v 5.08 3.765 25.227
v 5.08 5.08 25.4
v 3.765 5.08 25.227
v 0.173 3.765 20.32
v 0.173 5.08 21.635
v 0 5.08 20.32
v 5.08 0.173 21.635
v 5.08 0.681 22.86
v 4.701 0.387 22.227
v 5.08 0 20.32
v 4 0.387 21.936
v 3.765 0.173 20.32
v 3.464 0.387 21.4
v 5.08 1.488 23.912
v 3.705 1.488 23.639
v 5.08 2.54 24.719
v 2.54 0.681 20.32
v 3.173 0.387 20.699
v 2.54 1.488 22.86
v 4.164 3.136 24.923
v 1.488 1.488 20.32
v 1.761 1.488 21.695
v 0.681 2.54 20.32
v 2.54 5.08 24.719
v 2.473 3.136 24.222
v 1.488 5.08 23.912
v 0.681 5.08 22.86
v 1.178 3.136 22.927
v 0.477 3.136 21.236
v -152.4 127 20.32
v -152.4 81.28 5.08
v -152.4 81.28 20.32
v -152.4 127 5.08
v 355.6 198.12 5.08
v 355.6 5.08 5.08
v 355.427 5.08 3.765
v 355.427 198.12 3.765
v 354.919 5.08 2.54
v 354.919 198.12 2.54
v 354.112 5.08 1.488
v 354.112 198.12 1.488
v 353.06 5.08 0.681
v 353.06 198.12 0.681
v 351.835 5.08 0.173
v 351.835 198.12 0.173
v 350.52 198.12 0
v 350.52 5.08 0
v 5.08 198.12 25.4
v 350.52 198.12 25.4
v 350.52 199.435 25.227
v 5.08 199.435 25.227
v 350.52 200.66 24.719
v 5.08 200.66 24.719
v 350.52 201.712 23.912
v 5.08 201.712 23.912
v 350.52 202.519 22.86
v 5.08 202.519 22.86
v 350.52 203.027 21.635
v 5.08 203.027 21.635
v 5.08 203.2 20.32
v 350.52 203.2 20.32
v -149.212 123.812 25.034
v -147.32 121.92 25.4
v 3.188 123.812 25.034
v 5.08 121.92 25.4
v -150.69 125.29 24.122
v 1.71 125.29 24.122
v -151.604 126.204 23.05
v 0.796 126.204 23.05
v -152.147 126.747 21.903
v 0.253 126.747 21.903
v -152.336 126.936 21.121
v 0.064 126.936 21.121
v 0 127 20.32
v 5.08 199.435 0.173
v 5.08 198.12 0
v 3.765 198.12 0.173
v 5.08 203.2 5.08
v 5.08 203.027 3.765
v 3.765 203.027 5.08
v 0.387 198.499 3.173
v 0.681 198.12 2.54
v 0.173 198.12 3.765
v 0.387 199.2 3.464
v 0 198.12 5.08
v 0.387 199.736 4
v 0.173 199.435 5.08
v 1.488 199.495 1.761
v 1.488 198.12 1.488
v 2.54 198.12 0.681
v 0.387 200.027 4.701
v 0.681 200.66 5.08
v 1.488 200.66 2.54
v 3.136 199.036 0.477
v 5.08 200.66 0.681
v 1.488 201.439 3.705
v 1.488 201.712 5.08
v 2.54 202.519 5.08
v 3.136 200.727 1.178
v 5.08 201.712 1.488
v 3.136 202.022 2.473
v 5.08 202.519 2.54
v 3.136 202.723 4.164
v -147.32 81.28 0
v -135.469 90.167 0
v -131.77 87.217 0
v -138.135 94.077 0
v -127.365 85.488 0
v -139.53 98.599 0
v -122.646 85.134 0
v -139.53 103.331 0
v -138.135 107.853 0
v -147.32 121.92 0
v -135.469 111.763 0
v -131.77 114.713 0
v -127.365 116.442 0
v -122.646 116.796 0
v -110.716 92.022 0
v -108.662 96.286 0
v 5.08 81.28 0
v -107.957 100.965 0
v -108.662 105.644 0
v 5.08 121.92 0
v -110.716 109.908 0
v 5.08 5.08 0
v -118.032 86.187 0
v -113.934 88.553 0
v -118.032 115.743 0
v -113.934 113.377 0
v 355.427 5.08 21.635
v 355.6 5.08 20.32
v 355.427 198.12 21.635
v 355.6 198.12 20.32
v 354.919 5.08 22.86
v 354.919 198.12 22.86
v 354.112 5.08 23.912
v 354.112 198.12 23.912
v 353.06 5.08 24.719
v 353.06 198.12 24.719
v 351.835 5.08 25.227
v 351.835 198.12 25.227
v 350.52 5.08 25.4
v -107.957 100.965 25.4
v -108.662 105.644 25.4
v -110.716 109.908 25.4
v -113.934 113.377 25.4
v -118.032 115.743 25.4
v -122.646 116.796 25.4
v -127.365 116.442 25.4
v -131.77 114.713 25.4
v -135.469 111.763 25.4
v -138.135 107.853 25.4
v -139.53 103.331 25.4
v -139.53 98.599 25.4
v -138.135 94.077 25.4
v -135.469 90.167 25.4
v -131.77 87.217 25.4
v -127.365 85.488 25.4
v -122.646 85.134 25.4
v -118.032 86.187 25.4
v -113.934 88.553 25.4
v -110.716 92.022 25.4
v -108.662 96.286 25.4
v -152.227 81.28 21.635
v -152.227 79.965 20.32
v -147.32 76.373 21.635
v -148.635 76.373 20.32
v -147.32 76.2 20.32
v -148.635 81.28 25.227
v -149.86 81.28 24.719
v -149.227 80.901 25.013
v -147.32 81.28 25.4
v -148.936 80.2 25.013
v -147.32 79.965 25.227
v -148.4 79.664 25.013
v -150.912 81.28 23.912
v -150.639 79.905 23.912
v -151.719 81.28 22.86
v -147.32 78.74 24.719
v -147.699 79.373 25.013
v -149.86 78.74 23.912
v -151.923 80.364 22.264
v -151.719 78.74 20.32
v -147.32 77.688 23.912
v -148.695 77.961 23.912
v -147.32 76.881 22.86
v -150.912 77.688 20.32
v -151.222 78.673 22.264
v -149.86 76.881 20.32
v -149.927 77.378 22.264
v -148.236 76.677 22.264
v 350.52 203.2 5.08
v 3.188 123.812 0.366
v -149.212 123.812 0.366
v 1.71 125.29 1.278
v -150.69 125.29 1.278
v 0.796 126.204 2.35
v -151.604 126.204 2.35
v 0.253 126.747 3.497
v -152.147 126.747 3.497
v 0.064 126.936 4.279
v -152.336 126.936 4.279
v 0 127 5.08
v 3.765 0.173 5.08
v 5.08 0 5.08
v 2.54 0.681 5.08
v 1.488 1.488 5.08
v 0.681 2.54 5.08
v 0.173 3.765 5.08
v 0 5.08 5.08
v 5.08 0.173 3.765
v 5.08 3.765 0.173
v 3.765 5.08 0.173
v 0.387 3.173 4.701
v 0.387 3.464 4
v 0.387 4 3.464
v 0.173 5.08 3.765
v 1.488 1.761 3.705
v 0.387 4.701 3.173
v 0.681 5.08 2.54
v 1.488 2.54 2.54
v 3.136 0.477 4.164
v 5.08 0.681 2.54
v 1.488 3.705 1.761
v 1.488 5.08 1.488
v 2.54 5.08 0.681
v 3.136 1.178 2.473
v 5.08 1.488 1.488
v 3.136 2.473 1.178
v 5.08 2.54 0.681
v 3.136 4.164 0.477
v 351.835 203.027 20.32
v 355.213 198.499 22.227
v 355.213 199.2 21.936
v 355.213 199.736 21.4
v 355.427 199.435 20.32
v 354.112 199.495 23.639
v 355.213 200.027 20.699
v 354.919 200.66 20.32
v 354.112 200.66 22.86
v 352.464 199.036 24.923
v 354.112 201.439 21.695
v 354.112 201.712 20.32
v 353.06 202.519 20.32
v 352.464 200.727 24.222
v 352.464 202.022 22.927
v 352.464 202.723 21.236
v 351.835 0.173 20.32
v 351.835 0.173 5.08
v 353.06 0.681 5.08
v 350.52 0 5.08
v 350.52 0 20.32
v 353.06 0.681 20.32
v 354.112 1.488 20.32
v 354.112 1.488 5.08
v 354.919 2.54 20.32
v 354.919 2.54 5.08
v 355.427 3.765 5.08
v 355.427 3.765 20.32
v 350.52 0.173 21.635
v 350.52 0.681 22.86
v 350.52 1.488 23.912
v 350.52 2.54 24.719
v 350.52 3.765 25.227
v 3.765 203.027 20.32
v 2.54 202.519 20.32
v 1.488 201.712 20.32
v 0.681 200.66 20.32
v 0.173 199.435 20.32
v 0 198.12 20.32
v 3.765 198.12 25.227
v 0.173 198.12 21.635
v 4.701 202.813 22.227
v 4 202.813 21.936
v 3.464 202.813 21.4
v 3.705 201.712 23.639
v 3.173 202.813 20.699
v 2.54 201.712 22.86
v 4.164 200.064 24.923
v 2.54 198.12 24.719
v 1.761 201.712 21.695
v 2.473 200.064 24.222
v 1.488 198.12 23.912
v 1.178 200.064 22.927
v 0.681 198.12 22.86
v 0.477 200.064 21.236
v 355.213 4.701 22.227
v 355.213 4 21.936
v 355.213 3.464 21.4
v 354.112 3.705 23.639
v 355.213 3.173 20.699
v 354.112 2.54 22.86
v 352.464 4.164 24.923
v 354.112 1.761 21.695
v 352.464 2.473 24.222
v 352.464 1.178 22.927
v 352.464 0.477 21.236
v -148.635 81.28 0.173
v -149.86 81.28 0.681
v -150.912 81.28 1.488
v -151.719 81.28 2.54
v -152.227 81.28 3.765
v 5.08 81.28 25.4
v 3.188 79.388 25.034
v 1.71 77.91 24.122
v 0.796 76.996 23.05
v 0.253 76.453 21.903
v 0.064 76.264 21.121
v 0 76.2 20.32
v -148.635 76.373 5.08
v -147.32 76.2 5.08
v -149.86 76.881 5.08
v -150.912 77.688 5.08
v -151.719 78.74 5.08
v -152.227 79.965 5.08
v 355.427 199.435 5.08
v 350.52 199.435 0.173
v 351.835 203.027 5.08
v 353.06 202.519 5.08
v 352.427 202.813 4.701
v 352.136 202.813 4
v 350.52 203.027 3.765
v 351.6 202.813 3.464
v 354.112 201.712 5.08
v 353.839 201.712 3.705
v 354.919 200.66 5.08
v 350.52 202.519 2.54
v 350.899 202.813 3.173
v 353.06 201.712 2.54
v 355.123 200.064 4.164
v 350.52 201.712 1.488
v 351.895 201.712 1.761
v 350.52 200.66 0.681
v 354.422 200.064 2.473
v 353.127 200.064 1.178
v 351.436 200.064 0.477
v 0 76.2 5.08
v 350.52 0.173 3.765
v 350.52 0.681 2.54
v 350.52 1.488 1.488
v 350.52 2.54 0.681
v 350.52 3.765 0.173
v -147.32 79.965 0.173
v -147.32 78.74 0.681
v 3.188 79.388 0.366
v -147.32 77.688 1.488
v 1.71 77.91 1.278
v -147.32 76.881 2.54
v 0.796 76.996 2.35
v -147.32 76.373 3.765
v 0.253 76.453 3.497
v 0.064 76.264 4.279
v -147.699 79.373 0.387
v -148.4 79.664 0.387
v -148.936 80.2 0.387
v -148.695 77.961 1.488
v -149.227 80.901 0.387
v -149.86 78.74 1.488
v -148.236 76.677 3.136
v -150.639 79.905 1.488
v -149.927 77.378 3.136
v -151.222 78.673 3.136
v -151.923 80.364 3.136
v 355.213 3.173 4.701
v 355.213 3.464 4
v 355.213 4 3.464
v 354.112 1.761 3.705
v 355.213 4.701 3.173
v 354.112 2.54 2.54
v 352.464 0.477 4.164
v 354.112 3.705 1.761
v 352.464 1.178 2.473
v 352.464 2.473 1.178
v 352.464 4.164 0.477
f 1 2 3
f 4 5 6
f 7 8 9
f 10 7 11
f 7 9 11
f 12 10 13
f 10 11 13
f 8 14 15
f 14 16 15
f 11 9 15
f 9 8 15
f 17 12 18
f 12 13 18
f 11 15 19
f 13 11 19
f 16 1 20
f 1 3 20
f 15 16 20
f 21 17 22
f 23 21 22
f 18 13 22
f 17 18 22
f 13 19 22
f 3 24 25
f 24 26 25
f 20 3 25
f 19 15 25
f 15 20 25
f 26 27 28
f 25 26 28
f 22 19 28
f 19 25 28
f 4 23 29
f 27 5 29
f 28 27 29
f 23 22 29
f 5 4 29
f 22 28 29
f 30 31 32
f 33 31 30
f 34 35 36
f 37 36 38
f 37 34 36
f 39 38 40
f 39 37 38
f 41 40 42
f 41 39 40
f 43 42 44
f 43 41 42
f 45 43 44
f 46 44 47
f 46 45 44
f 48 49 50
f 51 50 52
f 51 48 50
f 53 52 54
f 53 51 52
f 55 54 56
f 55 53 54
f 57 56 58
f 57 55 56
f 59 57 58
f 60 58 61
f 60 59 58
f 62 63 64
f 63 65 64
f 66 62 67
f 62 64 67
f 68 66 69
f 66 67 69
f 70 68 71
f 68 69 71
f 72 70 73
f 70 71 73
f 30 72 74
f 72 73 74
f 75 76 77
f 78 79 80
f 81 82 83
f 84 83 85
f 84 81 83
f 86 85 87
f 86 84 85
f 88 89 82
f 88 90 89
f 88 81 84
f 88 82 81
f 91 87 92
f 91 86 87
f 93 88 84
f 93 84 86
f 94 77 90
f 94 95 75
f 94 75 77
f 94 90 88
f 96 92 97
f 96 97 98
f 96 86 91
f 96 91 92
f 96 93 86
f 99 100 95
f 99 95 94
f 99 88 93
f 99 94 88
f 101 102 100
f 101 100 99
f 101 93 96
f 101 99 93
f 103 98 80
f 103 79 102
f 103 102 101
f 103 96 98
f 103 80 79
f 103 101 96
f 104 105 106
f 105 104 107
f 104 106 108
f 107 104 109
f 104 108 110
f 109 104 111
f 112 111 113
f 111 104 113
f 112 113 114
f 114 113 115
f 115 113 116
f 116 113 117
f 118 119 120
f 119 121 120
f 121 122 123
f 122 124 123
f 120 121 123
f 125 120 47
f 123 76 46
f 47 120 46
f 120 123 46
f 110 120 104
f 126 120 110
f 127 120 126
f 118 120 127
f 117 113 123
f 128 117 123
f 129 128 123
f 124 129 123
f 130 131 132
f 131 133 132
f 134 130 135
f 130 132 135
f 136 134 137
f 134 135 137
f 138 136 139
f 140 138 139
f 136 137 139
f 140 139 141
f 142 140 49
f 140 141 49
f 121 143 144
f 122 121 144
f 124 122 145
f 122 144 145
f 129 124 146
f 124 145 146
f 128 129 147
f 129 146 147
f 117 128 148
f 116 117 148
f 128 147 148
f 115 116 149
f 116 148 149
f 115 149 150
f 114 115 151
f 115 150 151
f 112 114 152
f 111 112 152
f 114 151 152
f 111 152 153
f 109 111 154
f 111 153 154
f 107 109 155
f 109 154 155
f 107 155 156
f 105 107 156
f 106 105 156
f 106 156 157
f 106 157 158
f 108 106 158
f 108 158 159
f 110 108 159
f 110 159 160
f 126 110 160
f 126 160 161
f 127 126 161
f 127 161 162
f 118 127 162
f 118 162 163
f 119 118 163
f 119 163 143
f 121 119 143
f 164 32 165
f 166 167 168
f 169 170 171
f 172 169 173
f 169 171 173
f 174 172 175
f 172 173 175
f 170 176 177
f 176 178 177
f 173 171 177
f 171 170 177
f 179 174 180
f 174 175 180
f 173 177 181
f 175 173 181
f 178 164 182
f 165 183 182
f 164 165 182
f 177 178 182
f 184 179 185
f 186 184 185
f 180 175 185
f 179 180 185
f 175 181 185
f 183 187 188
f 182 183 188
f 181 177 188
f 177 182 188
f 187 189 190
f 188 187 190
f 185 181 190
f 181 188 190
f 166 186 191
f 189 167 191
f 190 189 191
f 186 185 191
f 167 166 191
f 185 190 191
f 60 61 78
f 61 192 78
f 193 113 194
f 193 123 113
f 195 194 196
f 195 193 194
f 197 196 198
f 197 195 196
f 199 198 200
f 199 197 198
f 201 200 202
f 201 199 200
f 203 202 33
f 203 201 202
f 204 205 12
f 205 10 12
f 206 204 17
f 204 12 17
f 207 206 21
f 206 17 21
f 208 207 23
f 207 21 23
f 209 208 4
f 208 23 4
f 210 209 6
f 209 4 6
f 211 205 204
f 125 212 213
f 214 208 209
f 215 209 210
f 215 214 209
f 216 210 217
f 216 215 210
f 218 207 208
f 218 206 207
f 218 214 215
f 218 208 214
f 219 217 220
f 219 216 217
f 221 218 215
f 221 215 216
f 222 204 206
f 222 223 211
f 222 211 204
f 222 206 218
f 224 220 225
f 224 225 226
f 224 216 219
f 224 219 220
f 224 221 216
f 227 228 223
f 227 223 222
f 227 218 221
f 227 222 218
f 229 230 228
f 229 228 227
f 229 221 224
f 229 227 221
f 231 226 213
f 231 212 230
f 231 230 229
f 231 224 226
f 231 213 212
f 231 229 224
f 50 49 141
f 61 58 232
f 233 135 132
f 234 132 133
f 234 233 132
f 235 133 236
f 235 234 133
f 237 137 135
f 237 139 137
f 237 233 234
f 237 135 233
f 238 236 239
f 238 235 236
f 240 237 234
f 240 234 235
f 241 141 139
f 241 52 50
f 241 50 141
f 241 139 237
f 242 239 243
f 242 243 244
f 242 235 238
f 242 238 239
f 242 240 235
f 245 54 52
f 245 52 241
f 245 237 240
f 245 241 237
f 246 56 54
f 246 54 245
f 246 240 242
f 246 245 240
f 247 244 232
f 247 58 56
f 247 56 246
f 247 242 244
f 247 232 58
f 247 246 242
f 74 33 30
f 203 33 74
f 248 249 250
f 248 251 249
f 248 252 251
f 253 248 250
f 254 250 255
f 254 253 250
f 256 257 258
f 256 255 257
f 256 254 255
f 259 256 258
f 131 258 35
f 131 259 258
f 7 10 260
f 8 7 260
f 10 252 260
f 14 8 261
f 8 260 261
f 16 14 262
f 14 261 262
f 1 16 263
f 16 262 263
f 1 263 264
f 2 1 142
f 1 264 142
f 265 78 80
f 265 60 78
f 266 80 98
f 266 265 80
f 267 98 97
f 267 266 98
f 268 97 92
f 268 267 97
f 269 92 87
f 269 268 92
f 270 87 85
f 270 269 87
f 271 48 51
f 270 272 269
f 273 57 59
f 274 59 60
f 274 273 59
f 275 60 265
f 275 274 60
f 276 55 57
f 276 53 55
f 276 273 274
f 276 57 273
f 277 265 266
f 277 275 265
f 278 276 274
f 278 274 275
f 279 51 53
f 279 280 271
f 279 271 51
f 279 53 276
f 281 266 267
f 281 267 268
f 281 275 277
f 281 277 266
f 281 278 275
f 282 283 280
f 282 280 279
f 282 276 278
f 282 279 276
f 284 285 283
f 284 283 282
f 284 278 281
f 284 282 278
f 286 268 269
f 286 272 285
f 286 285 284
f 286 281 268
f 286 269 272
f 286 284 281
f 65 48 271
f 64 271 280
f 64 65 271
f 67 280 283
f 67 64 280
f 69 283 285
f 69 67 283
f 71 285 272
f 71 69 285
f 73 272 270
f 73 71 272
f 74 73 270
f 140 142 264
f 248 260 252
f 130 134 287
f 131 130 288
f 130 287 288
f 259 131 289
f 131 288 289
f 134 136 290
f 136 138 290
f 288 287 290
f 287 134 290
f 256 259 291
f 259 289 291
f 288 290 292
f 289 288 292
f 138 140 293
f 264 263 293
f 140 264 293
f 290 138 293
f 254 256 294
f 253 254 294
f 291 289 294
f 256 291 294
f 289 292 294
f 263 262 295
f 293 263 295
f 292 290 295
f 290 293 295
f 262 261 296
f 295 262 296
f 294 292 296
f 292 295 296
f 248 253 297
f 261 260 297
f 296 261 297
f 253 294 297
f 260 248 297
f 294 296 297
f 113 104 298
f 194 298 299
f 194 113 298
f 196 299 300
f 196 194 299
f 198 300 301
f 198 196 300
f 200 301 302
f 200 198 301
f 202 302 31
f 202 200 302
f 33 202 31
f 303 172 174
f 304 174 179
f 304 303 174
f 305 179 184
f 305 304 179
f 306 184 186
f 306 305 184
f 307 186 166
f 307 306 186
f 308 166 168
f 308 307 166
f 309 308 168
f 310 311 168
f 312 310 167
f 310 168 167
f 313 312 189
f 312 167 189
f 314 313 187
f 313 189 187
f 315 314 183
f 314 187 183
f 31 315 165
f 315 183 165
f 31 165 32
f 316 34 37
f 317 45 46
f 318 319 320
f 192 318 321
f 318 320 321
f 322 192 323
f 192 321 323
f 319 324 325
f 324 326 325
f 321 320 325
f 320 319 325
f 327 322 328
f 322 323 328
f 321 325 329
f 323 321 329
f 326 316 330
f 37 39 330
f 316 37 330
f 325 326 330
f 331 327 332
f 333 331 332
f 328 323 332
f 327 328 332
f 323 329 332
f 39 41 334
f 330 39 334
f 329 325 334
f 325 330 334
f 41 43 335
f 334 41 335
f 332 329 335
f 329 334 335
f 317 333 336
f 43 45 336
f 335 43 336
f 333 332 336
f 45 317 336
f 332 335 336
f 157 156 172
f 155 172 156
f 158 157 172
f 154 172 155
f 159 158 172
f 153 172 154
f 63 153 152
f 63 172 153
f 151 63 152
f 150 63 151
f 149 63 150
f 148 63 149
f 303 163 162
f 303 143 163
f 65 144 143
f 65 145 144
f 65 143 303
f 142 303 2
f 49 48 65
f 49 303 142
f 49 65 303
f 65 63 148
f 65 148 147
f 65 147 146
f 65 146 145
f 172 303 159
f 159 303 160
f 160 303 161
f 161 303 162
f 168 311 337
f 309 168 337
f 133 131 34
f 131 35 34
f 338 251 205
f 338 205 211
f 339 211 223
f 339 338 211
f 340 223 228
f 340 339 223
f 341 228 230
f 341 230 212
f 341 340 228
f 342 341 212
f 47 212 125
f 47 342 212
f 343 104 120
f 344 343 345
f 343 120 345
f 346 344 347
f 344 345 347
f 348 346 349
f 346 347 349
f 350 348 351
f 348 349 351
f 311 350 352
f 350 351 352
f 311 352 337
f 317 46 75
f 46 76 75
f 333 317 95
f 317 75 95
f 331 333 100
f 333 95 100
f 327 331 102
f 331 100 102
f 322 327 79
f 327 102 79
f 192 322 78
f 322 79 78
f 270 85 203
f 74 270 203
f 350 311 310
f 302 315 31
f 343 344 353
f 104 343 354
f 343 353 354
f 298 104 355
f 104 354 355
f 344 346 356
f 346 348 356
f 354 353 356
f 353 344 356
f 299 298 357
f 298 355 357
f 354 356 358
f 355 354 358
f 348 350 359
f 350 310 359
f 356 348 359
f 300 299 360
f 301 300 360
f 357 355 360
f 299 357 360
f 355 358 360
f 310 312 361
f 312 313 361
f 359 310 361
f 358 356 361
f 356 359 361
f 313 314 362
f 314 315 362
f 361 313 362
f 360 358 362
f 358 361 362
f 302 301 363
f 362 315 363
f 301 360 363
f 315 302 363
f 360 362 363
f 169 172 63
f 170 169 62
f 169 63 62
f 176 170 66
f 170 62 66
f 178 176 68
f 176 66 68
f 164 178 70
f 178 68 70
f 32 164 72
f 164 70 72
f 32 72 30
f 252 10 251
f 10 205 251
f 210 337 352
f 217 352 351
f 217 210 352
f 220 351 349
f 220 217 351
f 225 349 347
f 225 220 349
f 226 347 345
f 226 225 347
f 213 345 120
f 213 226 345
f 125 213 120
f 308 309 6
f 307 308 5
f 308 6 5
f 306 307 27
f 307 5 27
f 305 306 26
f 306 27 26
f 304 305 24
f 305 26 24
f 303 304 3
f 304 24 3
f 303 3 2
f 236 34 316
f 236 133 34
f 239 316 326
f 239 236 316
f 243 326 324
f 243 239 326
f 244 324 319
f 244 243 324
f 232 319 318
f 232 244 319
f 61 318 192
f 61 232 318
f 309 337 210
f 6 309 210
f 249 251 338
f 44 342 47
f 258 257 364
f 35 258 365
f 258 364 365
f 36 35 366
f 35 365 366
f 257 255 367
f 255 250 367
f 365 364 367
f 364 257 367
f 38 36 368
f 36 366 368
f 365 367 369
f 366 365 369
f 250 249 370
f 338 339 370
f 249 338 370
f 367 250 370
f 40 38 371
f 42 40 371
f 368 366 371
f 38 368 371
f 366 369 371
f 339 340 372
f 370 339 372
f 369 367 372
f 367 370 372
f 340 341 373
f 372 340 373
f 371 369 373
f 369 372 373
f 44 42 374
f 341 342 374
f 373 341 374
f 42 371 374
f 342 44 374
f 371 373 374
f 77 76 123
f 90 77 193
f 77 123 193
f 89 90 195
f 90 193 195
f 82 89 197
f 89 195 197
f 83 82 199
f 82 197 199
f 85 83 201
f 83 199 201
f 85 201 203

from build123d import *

# Parameters (mm, degrees)
F0_W     = 152.4
F0_H     = 50.8
F1_DEPTH = 25.4
F2_R     = 15.875
F4_DEPTH = 25.401
F5_R     = 5.08


with BuildPart() as f1:
    # F0 (on Top) → F1 (new body)
    with BuildSketch(Plane.XY):
        Polygon((0, 76.2), (0, 0), (355.6, 0), (355.6, 203.2), (0, 203.2), (0, 127), align=None)
        with Locations((-76.2, 101.6)):
            Rectangle(F0_W, F0_H)
    extrude(amount=F1_DEPTH)

    # F2 (on face) → F4 (cut, through all)
    with BuildSketch(Plane.XY.offset(25.4)):
        with Locations((-123.832056, 100.965)):
            Circle(F2_R)
    extrude(amount=-F4_DEPTH, mode=Mode.SUBTRACT)

    # F5
    f5_edges = [f1.edges().sort_by_distance(p)[0] for p in [
        (-152.4, 76.2, 12.7),
        (-76.2, 127, 25.4),
        (-152.4, 101.6, 25.4),
        (-76.2, 76.2, 25.4),
        (-76.2, 76.2, 0),
        (0, 38.1, 25.4),
        (0, 165.1, 25.4),
        (177.8, 203.2, 25.4),
        (177.8, 0, 25.4),
        (177.8, 0, 0),
        (0, 0, 12.7),
        (355.6, 101.6, 25.4),
        (355.6, 0, 12.7),
        (355.6, 101.6, 0),
        (355.6, 203.2, 12.7),
        (177.8, 203.2, 0),
        (0, 38.1, 0),
        (0, 165.1, 0),
        (0, 203.2, 12.7),
        (-152.4, 101.6, 0),
        (-76.2, 127, 0),
    ]]
    fillet(f5_edges, radius=F5_R)


solid = f1.part
